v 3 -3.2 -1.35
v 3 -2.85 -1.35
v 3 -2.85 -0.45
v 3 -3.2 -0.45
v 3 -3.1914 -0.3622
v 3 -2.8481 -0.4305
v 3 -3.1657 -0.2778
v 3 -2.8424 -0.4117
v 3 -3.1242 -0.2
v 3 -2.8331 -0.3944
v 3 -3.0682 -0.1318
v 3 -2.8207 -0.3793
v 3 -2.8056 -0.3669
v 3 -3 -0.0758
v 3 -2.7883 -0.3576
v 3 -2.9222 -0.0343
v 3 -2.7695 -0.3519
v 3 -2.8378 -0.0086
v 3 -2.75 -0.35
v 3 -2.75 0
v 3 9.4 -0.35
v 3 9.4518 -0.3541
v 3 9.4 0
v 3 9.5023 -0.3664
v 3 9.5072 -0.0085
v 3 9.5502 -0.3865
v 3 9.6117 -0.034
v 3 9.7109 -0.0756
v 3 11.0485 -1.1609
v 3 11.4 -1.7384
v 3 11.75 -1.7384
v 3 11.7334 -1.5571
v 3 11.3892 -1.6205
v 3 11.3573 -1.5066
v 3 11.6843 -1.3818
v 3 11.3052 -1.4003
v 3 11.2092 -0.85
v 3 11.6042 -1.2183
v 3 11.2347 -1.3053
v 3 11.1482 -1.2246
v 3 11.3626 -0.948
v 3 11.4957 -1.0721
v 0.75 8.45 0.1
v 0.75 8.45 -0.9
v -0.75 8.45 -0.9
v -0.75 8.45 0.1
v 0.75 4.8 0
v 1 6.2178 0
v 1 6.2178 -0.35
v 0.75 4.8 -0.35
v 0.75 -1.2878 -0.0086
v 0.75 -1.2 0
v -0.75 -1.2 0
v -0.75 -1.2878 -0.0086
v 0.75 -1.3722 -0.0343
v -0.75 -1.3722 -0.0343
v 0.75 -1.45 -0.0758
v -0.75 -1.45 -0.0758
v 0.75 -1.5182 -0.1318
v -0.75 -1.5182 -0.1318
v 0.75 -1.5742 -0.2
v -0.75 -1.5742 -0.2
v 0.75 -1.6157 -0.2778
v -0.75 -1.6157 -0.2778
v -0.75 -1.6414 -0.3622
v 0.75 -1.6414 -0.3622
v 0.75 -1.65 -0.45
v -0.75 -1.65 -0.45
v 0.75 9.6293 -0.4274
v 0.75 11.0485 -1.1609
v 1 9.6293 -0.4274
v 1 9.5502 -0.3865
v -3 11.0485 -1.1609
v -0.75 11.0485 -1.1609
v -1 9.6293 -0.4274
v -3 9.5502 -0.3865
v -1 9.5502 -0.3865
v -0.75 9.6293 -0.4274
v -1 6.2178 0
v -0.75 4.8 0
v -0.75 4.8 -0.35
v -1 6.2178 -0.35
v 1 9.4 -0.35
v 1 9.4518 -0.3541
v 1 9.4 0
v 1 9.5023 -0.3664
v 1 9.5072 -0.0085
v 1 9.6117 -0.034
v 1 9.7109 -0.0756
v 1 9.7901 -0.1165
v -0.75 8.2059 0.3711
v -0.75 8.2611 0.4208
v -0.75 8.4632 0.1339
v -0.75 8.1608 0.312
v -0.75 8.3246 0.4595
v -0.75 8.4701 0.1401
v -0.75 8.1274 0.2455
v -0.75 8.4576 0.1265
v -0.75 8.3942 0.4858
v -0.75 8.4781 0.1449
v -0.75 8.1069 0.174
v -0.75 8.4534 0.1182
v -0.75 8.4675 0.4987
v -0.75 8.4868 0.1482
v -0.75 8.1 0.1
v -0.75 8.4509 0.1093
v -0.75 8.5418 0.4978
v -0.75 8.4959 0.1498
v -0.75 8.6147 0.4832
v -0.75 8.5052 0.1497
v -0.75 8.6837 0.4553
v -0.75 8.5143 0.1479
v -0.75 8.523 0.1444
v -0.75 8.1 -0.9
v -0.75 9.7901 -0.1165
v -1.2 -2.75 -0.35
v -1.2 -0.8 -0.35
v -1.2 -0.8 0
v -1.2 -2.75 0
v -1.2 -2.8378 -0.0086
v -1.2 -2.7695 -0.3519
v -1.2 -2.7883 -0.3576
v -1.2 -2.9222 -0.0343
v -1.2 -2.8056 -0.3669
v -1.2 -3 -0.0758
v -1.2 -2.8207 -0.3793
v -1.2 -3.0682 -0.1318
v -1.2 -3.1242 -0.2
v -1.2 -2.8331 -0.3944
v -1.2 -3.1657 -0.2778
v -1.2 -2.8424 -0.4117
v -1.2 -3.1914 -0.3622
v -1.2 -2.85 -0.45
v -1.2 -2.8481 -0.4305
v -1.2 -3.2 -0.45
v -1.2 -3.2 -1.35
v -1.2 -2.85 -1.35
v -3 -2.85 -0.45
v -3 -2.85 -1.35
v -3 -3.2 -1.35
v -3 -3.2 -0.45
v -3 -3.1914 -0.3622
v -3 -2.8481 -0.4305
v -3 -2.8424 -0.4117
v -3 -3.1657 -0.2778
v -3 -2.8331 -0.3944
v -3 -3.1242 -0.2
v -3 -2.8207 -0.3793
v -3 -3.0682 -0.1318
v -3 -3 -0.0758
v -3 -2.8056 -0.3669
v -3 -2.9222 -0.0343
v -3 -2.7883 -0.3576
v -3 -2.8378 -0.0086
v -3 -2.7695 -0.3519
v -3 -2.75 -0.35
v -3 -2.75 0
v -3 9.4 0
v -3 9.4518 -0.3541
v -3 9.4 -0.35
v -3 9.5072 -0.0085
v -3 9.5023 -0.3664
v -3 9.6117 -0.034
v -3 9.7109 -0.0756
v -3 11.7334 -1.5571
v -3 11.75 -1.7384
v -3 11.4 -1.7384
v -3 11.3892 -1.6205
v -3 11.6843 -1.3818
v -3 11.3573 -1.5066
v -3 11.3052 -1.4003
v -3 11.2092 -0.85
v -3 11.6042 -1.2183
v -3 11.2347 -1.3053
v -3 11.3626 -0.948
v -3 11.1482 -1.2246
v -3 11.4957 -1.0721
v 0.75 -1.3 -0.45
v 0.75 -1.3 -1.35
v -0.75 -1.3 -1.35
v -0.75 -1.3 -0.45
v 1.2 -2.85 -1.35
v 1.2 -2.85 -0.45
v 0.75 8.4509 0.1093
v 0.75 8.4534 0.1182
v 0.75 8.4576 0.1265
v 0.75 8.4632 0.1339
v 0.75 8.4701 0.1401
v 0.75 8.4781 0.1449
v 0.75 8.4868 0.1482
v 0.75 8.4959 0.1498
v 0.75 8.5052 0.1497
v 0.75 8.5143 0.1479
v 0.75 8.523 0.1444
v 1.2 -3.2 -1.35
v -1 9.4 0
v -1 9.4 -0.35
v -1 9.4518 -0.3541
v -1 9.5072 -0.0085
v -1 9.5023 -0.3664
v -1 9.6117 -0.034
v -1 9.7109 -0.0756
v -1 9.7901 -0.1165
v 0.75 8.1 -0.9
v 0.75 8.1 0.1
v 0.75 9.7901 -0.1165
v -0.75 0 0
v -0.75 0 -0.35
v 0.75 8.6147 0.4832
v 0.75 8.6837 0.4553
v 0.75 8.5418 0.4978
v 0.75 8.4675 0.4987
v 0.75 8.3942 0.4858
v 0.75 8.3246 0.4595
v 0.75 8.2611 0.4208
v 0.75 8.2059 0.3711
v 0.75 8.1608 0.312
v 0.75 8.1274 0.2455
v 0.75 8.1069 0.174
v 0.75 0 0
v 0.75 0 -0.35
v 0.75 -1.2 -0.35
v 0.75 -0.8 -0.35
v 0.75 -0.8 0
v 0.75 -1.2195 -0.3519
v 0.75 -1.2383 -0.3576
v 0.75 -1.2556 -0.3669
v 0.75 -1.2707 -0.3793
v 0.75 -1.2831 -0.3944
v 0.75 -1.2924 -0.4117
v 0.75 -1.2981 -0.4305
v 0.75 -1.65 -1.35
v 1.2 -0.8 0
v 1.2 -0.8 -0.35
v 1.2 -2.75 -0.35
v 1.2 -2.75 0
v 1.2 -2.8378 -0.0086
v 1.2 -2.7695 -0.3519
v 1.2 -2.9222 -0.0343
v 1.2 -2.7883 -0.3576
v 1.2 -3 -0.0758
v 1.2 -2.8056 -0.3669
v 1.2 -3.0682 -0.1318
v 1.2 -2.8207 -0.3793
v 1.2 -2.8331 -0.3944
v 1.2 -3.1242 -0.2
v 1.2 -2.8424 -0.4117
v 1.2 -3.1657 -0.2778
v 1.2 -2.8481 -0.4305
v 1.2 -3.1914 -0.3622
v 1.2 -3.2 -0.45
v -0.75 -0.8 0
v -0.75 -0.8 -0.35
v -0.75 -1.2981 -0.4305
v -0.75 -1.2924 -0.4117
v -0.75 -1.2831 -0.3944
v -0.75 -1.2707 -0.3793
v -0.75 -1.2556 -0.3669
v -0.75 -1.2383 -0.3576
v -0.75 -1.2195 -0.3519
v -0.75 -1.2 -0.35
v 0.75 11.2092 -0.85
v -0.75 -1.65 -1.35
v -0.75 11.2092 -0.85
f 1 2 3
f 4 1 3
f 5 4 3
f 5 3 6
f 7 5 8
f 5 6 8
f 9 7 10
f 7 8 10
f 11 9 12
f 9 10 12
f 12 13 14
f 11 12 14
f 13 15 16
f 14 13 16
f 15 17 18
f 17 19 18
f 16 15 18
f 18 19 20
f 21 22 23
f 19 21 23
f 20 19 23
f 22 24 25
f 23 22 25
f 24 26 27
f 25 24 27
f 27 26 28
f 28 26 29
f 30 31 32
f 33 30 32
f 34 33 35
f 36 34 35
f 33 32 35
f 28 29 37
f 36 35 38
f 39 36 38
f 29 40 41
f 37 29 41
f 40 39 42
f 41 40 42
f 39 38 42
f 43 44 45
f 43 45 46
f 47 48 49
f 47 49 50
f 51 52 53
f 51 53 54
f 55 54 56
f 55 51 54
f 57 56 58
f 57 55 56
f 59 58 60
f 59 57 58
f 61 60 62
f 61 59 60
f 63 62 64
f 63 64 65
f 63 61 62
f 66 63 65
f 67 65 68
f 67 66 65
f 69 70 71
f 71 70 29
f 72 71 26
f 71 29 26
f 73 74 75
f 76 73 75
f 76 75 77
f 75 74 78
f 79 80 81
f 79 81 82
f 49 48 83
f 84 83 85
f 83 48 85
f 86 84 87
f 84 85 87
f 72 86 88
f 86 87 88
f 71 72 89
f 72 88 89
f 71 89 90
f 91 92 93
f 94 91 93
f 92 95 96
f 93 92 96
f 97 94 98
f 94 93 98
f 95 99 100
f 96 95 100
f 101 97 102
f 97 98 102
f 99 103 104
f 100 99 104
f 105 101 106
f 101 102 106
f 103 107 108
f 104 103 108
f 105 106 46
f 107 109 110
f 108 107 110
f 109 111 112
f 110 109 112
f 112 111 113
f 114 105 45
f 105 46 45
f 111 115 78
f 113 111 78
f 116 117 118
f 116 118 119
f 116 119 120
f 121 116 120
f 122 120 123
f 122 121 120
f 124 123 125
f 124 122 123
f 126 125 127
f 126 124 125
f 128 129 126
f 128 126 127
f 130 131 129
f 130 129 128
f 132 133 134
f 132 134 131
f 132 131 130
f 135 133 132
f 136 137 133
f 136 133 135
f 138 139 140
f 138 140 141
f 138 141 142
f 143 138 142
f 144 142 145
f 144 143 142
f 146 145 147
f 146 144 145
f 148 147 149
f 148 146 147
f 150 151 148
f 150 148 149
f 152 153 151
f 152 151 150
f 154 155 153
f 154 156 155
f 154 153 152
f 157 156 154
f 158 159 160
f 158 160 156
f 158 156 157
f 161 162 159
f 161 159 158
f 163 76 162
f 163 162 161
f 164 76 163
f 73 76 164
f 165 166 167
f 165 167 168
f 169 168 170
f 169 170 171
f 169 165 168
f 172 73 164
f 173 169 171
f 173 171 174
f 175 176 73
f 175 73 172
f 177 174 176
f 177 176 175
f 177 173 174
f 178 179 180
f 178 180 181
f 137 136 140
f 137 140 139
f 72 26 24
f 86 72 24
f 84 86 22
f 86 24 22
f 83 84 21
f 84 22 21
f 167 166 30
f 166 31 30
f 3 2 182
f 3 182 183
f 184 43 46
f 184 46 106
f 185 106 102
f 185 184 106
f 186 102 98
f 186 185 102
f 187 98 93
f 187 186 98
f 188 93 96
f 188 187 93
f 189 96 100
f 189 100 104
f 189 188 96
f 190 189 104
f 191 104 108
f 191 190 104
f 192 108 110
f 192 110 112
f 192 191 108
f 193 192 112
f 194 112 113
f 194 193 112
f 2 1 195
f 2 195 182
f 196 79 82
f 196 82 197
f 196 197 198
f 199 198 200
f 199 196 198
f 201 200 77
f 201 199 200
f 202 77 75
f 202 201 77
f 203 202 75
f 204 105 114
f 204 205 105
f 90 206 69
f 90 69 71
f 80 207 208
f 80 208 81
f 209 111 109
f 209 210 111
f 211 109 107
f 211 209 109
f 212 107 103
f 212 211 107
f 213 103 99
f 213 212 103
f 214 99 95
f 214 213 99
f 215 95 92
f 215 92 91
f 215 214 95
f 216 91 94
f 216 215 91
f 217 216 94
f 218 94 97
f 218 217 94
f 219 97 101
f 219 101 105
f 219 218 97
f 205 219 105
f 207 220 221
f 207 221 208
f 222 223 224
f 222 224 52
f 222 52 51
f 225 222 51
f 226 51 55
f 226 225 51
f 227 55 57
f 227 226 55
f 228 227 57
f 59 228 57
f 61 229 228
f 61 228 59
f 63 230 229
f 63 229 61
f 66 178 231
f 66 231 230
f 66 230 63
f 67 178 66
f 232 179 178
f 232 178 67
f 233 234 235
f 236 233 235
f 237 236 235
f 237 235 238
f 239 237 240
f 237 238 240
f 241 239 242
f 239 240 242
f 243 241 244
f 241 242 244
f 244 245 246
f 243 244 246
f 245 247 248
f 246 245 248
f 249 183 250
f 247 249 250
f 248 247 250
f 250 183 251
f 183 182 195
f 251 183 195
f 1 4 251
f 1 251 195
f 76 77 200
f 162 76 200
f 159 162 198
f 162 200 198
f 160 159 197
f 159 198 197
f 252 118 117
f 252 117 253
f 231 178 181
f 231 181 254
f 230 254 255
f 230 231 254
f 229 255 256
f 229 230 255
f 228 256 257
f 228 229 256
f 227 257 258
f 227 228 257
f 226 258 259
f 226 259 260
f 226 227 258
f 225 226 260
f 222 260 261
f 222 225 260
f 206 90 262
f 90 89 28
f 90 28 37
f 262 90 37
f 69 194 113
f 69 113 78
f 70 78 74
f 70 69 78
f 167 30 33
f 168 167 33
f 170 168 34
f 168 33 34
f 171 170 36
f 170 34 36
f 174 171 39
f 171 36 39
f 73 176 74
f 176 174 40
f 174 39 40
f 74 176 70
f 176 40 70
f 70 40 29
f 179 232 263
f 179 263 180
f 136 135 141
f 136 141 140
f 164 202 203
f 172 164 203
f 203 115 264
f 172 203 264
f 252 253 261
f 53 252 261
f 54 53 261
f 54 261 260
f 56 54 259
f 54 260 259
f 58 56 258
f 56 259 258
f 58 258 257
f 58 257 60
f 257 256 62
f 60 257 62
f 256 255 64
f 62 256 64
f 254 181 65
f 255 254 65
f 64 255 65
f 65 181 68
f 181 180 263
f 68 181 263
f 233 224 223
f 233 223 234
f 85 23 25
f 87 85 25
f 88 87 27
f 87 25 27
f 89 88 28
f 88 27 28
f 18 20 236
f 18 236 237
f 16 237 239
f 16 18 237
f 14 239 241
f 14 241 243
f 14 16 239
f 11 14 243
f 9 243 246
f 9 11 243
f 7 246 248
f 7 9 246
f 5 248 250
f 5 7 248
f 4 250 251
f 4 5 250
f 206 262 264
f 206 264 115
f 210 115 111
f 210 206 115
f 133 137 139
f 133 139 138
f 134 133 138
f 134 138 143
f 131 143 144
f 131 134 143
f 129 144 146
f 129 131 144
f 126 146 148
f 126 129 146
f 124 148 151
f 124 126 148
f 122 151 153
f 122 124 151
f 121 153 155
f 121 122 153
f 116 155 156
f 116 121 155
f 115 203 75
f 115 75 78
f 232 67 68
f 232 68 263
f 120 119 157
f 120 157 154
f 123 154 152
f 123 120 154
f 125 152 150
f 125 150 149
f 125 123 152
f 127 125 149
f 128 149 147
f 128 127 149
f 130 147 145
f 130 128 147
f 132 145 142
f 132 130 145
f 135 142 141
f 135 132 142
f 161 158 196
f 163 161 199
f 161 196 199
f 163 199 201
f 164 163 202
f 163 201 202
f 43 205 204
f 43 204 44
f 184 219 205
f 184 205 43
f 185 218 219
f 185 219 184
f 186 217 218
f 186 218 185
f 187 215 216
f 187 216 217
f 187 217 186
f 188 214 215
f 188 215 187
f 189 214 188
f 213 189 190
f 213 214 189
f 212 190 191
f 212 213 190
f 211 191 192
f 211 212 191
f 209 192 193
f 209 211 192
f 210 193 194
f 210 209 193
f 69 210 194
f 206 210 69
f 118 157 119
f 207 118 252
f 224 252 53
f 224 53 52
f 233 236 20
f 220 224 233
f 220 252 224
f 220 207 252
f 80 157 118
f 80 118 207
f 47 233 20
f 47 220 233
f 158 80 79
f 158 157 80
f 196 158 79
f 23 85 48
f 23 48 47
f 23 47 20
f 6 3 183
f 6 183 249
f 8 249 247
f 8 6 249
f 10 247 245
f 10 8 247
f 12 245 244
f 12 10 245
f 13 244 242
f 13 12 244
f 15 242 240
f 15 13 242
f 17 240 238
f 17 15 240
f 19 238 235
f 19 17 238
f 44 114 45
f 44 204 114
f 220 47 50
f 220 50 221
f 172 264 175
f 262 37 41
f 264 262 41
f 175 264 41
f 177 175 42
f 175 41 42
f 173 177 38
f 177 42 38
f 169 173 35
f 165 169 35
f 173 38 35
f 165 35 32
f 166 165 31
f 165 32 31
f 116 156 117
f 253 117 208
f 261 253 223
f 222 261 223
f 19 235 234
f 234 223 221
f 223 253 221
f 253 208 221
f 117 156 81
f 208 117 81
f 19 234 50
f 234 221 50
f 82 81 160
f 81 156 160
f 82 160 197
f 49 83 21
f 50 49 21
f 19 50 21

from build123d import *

# Parameters (mm, degrees)
MAIN_PLATE_DEPTH               = 0.35
EDGE_FLANGE1_STRIP_W           = 1.6
EDGE_FLANGE1_STRIP_H           = 0.35
EDGE_FLANGE1_STRIP_CUT_DEPTH   = 1.8
EDGE_FLANGE1_STRIP_2_W         = 1.6
EDGE_FLANGE1_STRIP_2_H         = 0.35
EDGE_FLANGE1_STRIP_CUT_2_DEPTH = 1.8
EDGE_FLANGE1_STRIP_3_W         = 1.6
EDGE_FLANGE1_STRIP_3_H         = 0.35
EDGE_FLANGE1_STRIP_CUT_3_DEPTH = 1.5
EDGE_FLANGE1_DEPTH             = 1.8
EDGE_FLANGE1_BEND_DEPTH        = 1.8
EDGE_FLANGE1_BEND_2_DEPTH      = 1.5
CENTRAL_SECTION_DEPTH          = 0.75
BOSS_EXTRUDE3_DEPTH            = 2.25
BOSS_EXTRUDE4_START            = -2.25
BOSS_EXTRUDE4_DEPTH            = 2.25
SKETCH20_W                     = 0.25
SKETCH20_H                     = 0.4
CUT_EXTRUDE1_DEPTH             = 1


# Sheet-metal steps are written as plain solids
with BuildPart() as part:
    # Sketch1 → Main Plate (new body)
    with BuildSketch(Plane.XY):
        Polygon((-3, 9.4), (-3, -2.85), (-1.2, -2.85), (-1.2, -0.8), (-0.75, -0.8), (-0.75, -1.3), (0.75, -1.3), (0.75, -0.8), (1.2, -0.8), (1.2, -2.85), (3, -2.85), (3, 9.4), (1, 9.4), (1, 6.217820455), (0.75, 4.8), (0.75, 0), (-0.75, 0), (-0.75, 4.8), (-1, 6.217820455), (-1, 9.4), align=None)
    extrude(amount=-MAIN_PLATE_DEPTH)

    # Edge-Flange1 strip (across the edge) → Edge-Flange1 strip cut (cut)
    with BuildSketch(Plane(origin=(3, -2.85, -0.35), x_dir=(0, 1, 0), z_dir=(-1, 0, 0))):
        with Locations((-0.7, -0.175)):
            Rectangle(EDGE_FLANGE1_STRIP_W, EDGE_FLANGE1_STRIP_H)
    extrude(amount=EDGE_FLANGE1_STRIP_CUT_DEPTH, mode=Mode.SUBTRACT)

    # Edge-Flange1 strip 2 (across the edge) → Edge-Flange1 strip cut 2 (cut)
    with BuildSketch(Plane(origin=(-1.2, -2.85, -0.35), x_dir=(0, 1, 0), z_dir=(-1, 0, 0))):
        with Locations((-0.7, -0.175)):
            Rectangle(EDGE_FLANGE1_STRIP_2_W, EDGE_FLANGE1_STRIP_2_H)
    extrude(amount=EDGE_FLANGE1_STRIP_CUT_2_DEPTH, mode=Mode.SUBTRACT)

    # Edge-Flange1 strip 3 (across the edge) → Edge-Flange1 strip cut 3 (cut)
    with BuildSketch(Plane(origin=(0.75, -1.3, -0.35), x_dir=(0, 1, 0), z_dir=(-1, 0, 0))):
        with Locations((-0.7, -0.175)):
            Rectangle(EDGE_FLANGE1_STRIP_3_W, EDGE_FLANGE1_STRIP_3_H)
    extrude(amount=EDGE_FLANGE1_STRIP_CUT_3_DEPTH, mode=Mode.SUBTRACT)

    # Edge-Flange1 section (across the edge) → Edge-Flange1 (add)
    with BuildSketch(Plane(origin=(3, -2.85, -0.35), x_dir=(0, 1, 0), z_dir=(-1, 0, 0))):
        with BuildLine():
            Line((-0.35, 0.1), (-0.35, 1))
            Line((-0.35, 1), (0, 1))
            Line((0, 1), (0, 0.1))
            ThreePointArc((0, 0.1), (0.029289322, 0.029289322), (0.1, 0))
            Line((0.1, 0), (0.1, -0.35))
            ThreePointArc((0.1, -0.35), (-0.218198052, -0.218198052), (-0.35, 0.1))
        make_face()
    extrude(amount=EDGE_FLANGE1_DEPTH)

    # Edge-Flange1 section 2 (across the edge) → Edge-Flange1 bend (add)
    with BuildSketch(Plane(origin=(-1.2, -2.85, -0.35), x_dir=(0, 1, 0), z_dir=(-1, 0, 0))):
        with BuildLine():
            Line((-0.35, 0.1), (-0.35, 1))
            Line((-0.35, 1), (0, 1))
            Line((0, 1), (0, 0.1))
            ThreePointArc((0, 0.1), (0.029289322, 0.029289322), (0.1, 0))
            Line((0.1, 0), (0.1, -0.35))
            ThreePointArc((0.1, -0.35), (-0.218198052, -0.218198052), (-0.35, 0.1))
        make_face()
    extrude(amount=EDGE_FLANGE1_BEND_DEPTH)

    # Edge-Flange1 section 3 (across the edge) → Edge-Flange1 bend 2 (add)
    with BuildSketch(Plane(origin=(0.75, -1.3, -0.35), x_dir=(0, 1, 0), z_dir=(-1, 0, 0))):
        with BuildLine():
            Line((-0.35, 0.1), (-0.35, 1))
            Line((-0.35, 1), (0, 1))
            Line((0, 1), (0, 0.1))
            ThreePointArc((0, 0.1), (0.029289322, 0.029289322), (0.1, 0))
            Line((0.1, 0), (0.1, -0.35))
            ThreePointArc((0.1, -0.35), (-0.218198052, -0.218198052), (-0.35, 0.1))
        make_face()
    extrude(amount=EDGE_FLANGE1_BEND_2_DEPTH)



with BuildPart() as body_2:
    # Sketch15 → Central Section (new, symmetric)
    with BuildSketch(Plane(origin=(0, 0, 0), x_dir=(0, 0, -1), z_dir=(1, 0, 0))):
        with BuildLine():
            Line((0.9, 8.1), (0.9, 8.45))
            Line((0.9, 8.45), (-0.1, 8.45))
            ThreePointArc((-0.1, 8.45), (-0.14270772, 8.473999025), (-0.144417693, 8.522957973))
            Line((-0.144417693, 8.522957973), (1.160923854, 11.048453645))
            ThreePointArc((1.160923854, 11.048453645), (1.400341198, 11.305200355), (1.738353869, 11.4))
            Line((1.738353869, 11.4), (1.738353869, 11.75))
            ThreePointArc((1.738353869, 11.75), (1.218334376, 11.604154393), (0.85, 11.209159454))
            Line((0.85, 11.209159454), (-0.455341547, 8.683663782))
            ThreePointArc((-0.455341547, 8.683663782), (-0.441661757, 8.291992203), (-0.1, 8.1))
            Line((-0.1, 8.1), (0.9, 8.1))
        make_face()
    extrude(amount=CENTRAL_SECTION_DEPTH, both=True)


with BuildPart() as part_1:
    add(part.part)

    add(body_2.part)  # Boss-Extrude3 merges body 2
    # Sketch16 → Boss-Extrude3 (add)
    with BuildSketch(Plane(origin=(3, 0, 0), x_dir=(0, 0, -1), z_dir=(1, 0, 0))):
        with BuildLine():
            Line((0.35, 9.4), (0, 9.4))
            ThreePointArc((0, 9.4), (0.019169334, 9.55996991), (0.075591878, 9.710881579))
            Line((0.075591878, 9.710881579), (0.85, 11.209159454))
            ThreePointArc((0.85, 11.209159454), (1.218334376, 11.604154393), (1.738353869, 11.75))
            Line((1.738353869, 11.75), (1.738353869, 11.4))
            ThreePointArc((1.738353869, 11.4), (1.400341198, 11.305200355), (1.160923854, 11.048453645))
            Line((1.160923854, 11.048453645), (0.386515732, 9.55017577))
            ThreePointArc((0.386515732, 9.55017577), (0.359260019, 9.477275741), (0.35, 9.4))
        make_face()
    extrude(amount=-BOSS_EXTRUDE3_DEPTH)

    # Sketch19 → Boss-Extrude4 (add)
    with BuildSketch(Plane.ZY.offset(3).offset(BOSS_EXTRUDE4_START)):
        with BuildLine():
            Line((-0.35, 9.4), (0, 9.4))
            ThreePointArc((0, 9.4), (-0.019169334, 9.55996991), (-0.075591878, 9.710881579))
            Line((-0.075591878, 9.710881579), (-0.85, 11.209159454))
            ThreePointArc((-0.85, 11.209159454), (-1.218334376, 11.604154393), (-1.738353869, 11.75))
            Line((-1.738353869, 11.75), (-1.738353869, 11.4))
            ThreePointArc((-1.738353869, 11.4), (-1.400341198, 11.305200355), (-1.160923854, 11.048453645))
            Line((-1.160923854, 11.048453645), (-0.386515732, 9.55017577))
            ThreePointArc((-0.386515732, 9.55017577), (-0.359260019, 9.477275741), (-0.35, 9.4))
        make_face()
    extrude(amount=BOSS_EXTRUDE4_DEPTH)

    # Sketch20 → Cut-Extrude1 (cut)
    with BuildSketch(Plane(origin=(0, 2.016486324, 3.901375463), x_dir=(1, 0, 0), z_dir=(0, 0.4591594538479162, 0.8883538686481212))):
        with Locations((0.875, 8.550526365)):
            Rectangle(SKETCH20_W, SKETCH20_H)
        with Locations((-0.875, 8.550526365)):
            Rectangle(SKETCH20_W, SKETCH20_H)
    extrude(amount=-CUT_EXTRUDE1_DEPTH, mode=Mode.SUBTRACT)


solid = part_1.part
